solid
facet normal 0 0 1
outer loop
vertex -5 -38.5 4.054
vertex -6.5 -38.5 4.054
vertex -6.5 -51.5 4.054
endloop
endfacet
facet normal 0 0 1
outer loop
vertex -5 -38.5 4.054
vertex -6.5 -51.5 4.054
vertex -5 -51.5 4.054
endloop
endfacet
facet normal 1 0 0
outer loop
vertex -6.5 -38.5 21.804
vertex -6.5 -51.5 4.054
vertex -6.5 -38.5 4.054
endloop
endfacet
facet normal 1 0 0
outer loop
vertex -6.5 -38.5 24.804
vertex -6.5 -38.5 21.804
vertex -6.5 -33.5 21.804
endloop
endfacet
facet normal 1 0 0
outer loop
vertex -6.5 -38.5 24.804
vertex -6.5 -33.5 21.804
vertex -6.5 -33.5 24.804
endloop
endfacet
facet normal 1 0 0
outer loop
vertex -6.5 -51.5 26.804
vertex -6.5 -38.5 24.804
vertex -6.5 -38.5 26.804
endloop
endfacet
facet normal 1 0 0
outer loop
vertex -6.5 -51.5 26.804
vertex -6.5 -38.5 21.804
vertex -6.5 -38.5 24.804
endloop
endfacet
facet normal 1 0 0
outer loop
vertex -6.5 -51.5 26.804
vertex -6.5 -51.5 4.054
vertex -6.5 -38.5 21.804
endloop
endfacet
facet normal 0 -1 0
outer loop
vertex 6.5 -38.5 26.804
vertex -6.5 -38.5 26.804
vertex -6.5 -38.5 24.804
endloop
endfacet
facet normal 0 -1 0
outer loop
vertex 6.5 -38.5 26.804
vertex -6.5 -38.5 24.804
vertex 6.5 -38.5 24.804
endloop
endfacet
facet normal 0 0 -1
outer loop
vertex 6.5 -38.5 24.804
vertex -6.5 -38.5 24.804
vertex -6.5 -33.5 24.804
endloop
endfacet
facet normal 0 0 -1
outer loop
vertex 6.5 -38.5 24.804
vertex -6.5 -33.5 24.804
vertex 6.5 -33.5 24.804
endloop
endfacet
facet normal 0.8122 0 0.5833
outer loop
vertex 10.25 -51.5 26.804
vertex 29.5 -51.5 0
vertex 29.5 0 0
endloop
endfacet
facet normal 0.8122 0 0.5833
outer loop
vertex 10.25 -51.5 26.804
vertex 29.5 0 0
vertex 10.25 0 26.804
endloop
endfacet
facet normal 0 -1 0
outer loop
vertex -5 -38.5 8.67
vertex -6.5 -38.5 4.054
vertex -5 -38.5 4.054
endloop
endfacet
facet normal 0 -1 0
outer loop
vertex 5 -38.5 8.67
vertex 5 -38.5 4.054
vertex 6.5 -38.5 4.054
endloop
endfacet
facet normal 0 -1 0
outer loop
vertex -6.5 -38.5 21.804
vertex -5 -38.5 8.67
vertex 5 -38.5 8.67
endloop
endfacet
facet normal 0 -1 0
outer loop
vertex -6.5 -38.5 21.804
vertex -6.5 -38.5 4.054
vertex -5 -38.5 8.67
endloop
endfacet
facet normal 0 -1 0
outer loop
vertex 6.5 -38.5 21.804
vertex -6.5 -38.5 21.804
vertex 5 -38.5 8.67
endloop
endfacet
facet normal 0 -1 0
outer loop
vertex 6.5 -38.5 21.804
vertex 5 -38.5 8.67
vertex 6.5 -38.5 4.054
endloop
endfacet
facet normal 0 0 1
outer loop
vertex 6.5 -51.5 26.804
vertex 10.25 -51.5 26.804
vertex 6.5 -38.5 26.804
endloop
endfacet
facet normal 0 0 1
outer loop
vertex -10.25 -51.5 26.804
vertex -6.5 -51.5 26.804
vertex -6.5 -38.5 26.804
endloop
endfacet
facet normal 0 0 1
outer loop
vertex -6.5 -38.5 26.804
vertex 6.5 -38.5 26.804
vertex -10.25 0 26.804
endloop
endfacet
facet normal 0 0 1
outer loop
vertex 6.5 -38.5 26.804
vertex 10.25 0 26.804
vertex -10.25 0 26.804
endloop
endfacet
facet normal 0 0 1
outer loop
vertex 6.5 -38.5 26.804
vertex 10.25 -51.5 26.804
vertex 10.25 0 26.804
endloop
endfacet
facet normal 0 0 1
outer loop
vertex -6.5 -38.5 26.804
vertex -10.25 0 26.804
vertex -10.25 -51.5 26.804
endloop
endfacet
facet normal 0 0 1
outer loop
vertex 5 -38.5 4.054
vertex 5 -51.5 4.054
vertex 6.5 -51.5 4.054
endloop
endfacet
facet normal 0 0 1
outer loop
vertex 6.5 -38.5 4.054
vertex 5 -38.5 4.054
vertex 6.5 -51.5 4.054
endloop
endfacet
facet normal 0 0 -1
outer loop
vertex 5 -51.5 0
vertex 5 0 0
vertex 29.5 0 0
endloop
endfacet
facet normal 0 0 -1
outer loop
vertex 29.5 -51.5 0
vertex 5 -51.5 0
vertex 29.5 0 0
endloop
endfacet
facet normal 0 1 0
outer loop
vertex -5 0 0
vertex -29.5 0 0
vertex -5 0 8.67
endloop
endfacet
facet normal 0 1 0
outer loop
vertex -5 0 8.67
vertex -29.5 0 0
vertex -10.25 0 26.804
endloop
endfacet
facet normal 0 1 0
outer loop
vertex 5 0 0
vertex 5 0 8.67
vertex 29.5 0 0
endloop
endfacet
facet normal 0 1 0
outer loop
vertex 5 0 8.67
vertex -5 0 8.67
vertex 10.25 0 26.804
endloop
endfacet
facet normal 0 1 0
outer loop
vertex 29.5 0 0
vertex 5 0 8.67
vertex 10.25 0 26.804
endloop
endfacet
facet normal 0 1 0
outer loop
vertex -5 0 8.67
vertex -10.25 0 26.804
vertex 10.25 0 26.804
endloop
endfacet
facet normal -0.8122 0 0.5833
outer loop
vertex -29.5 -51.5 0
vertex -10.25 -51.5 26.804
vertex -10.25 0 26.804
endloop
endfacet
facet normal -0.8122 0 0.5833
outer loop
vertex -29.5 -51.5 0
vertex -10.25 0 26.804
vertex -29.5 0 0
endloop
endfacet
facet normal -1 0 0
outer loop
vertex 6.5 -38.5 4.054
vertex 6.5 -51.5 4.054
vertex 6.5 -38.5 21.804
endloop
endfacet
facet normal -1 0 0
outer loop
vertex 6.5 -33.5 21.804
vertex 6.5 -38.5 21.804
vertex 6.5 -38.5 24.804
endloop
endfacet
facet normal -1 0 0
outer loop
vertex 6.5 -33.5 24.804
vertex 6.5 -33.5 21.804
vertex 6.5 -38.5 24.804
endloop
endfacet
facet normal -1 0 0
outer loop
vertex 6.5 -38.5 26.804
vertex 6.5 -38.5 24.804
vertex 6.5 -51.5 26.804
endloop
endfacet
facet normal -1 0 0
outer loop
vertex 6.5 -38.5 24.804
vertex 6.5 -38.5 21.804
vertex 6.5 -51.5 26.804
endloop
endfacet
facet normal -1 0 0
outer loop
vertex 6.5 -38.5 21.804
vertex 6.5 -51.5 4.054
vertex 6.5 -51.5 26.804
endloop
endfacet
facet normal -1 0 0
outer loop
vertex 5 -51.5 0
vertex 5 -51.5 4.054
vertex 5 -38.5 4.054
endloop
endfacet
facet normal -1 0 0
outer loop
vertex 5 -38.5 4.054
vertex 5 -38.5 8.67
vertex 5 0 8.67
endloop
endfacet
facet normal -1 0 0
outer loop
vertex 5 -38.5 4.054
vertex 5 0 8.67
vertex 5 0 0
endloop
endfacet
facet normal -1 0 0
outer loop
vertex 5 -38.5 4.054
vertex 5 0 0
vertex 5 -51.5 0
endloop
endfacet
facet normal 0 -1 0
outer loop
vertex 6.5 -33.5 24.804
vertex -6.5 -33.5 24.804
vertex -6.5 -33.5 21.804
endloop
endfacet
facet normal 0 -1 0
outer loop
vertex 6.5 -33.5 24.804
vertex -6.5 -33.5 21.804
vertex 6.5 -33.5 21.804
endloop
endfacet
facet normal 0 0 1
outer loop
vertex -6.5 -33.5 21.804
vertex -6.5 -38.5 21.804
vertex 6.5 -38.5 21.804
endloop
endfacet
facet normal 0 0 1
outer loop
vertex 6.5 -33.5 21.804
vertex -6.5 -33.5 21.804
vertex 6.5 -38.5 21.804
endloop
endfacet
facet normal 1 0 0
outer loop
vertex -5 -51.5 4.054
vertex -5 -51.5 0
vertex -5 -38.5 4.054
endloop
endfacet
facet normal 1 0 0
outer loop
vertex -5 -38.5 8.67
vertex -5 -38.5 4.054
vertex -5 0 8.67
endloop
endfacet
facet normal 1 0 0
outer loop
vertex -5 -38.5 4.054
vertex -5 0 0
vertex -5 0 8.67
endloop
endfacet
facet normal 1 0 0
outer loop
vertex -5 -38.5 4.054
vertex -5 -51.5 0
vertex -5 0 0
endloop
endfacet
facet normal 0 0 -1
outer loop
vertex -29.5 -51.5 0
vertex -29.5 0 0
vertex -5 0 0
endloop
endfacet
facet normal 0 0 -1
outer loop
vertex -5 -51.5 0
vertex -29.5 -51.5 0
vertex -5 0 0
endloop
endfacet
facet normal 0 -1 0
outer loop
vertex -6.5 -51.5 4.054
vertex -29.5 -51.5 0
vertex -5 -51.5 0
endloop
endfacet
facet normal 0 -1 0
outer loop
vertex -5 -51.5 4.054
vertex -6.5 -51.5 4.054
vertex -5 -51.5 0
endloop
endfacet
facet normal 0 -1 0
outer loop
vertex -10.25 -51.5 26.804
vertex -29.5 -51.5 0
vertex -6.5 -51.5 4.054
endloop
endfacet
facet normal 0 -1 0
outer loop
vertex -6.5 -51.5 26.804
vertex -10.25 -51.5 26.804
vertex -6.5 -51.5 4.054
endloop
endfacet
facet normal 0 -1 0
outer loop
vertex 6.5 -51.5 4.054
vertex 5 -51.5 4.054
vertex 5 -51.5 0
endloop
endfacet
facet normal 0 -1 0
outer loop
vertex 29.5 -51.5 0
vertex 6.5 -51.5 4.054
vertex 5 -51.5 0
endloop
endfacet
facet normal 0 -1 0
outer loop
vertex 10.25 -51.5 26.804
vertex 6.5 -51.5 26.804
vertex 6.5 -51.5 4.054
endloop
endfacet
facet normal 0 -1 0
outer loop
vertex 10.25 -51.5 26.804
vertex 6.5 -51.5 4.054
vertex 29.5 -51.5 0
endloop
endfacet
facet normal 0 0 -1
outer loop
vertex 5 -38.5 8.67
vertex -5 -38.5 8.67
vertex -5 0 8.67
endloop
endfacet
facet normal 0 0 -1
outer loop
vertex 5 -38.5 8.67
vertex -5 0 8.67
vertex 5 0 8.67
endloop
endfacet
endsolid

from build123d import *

# Parameters (mm, degrees)
F1_DEPTH = 51.5
F2_W     = 13
F2_H     = 22.75
F3_DEPTH = 13
F4_W     = 13
F4_H     = 3
F5_DEPTH = 5


with BuildPart() as f1:
    # F0 (on Front) → F1 (new body)
    with BuildSketch(Plane.XZ):
        Polygon((-10.25, 26.803684), (-29.5, 0), (-5, 0), (-5, 8.67), (5, 8.67), (5, 0), (29.5, 0), (10.25, 26.803684), align=None)
    extrude(amount=F1_DEPTH)

    # F2 (on face) → F3 (cut)
    with BuildSketch(Plane.XZ.offset(51.5)):
        with Locations((0, 15.428684)):
            Rectangle(F2_W, F2_H)
    extrude(amount=-F3_DEPTH, mode=Mode.SUBTRACT)

    # F4 (on face) → F5 (cut)
    with BuildSketch(Plane.XZ.offset(38.5)):
        with Locations((0, 23.303684)):
            Rectangle(F4_W, F4_H)
    extrude(amount=-F5_DEPTH, mode=Mode.SUBTRACT)


solid = f1.part
